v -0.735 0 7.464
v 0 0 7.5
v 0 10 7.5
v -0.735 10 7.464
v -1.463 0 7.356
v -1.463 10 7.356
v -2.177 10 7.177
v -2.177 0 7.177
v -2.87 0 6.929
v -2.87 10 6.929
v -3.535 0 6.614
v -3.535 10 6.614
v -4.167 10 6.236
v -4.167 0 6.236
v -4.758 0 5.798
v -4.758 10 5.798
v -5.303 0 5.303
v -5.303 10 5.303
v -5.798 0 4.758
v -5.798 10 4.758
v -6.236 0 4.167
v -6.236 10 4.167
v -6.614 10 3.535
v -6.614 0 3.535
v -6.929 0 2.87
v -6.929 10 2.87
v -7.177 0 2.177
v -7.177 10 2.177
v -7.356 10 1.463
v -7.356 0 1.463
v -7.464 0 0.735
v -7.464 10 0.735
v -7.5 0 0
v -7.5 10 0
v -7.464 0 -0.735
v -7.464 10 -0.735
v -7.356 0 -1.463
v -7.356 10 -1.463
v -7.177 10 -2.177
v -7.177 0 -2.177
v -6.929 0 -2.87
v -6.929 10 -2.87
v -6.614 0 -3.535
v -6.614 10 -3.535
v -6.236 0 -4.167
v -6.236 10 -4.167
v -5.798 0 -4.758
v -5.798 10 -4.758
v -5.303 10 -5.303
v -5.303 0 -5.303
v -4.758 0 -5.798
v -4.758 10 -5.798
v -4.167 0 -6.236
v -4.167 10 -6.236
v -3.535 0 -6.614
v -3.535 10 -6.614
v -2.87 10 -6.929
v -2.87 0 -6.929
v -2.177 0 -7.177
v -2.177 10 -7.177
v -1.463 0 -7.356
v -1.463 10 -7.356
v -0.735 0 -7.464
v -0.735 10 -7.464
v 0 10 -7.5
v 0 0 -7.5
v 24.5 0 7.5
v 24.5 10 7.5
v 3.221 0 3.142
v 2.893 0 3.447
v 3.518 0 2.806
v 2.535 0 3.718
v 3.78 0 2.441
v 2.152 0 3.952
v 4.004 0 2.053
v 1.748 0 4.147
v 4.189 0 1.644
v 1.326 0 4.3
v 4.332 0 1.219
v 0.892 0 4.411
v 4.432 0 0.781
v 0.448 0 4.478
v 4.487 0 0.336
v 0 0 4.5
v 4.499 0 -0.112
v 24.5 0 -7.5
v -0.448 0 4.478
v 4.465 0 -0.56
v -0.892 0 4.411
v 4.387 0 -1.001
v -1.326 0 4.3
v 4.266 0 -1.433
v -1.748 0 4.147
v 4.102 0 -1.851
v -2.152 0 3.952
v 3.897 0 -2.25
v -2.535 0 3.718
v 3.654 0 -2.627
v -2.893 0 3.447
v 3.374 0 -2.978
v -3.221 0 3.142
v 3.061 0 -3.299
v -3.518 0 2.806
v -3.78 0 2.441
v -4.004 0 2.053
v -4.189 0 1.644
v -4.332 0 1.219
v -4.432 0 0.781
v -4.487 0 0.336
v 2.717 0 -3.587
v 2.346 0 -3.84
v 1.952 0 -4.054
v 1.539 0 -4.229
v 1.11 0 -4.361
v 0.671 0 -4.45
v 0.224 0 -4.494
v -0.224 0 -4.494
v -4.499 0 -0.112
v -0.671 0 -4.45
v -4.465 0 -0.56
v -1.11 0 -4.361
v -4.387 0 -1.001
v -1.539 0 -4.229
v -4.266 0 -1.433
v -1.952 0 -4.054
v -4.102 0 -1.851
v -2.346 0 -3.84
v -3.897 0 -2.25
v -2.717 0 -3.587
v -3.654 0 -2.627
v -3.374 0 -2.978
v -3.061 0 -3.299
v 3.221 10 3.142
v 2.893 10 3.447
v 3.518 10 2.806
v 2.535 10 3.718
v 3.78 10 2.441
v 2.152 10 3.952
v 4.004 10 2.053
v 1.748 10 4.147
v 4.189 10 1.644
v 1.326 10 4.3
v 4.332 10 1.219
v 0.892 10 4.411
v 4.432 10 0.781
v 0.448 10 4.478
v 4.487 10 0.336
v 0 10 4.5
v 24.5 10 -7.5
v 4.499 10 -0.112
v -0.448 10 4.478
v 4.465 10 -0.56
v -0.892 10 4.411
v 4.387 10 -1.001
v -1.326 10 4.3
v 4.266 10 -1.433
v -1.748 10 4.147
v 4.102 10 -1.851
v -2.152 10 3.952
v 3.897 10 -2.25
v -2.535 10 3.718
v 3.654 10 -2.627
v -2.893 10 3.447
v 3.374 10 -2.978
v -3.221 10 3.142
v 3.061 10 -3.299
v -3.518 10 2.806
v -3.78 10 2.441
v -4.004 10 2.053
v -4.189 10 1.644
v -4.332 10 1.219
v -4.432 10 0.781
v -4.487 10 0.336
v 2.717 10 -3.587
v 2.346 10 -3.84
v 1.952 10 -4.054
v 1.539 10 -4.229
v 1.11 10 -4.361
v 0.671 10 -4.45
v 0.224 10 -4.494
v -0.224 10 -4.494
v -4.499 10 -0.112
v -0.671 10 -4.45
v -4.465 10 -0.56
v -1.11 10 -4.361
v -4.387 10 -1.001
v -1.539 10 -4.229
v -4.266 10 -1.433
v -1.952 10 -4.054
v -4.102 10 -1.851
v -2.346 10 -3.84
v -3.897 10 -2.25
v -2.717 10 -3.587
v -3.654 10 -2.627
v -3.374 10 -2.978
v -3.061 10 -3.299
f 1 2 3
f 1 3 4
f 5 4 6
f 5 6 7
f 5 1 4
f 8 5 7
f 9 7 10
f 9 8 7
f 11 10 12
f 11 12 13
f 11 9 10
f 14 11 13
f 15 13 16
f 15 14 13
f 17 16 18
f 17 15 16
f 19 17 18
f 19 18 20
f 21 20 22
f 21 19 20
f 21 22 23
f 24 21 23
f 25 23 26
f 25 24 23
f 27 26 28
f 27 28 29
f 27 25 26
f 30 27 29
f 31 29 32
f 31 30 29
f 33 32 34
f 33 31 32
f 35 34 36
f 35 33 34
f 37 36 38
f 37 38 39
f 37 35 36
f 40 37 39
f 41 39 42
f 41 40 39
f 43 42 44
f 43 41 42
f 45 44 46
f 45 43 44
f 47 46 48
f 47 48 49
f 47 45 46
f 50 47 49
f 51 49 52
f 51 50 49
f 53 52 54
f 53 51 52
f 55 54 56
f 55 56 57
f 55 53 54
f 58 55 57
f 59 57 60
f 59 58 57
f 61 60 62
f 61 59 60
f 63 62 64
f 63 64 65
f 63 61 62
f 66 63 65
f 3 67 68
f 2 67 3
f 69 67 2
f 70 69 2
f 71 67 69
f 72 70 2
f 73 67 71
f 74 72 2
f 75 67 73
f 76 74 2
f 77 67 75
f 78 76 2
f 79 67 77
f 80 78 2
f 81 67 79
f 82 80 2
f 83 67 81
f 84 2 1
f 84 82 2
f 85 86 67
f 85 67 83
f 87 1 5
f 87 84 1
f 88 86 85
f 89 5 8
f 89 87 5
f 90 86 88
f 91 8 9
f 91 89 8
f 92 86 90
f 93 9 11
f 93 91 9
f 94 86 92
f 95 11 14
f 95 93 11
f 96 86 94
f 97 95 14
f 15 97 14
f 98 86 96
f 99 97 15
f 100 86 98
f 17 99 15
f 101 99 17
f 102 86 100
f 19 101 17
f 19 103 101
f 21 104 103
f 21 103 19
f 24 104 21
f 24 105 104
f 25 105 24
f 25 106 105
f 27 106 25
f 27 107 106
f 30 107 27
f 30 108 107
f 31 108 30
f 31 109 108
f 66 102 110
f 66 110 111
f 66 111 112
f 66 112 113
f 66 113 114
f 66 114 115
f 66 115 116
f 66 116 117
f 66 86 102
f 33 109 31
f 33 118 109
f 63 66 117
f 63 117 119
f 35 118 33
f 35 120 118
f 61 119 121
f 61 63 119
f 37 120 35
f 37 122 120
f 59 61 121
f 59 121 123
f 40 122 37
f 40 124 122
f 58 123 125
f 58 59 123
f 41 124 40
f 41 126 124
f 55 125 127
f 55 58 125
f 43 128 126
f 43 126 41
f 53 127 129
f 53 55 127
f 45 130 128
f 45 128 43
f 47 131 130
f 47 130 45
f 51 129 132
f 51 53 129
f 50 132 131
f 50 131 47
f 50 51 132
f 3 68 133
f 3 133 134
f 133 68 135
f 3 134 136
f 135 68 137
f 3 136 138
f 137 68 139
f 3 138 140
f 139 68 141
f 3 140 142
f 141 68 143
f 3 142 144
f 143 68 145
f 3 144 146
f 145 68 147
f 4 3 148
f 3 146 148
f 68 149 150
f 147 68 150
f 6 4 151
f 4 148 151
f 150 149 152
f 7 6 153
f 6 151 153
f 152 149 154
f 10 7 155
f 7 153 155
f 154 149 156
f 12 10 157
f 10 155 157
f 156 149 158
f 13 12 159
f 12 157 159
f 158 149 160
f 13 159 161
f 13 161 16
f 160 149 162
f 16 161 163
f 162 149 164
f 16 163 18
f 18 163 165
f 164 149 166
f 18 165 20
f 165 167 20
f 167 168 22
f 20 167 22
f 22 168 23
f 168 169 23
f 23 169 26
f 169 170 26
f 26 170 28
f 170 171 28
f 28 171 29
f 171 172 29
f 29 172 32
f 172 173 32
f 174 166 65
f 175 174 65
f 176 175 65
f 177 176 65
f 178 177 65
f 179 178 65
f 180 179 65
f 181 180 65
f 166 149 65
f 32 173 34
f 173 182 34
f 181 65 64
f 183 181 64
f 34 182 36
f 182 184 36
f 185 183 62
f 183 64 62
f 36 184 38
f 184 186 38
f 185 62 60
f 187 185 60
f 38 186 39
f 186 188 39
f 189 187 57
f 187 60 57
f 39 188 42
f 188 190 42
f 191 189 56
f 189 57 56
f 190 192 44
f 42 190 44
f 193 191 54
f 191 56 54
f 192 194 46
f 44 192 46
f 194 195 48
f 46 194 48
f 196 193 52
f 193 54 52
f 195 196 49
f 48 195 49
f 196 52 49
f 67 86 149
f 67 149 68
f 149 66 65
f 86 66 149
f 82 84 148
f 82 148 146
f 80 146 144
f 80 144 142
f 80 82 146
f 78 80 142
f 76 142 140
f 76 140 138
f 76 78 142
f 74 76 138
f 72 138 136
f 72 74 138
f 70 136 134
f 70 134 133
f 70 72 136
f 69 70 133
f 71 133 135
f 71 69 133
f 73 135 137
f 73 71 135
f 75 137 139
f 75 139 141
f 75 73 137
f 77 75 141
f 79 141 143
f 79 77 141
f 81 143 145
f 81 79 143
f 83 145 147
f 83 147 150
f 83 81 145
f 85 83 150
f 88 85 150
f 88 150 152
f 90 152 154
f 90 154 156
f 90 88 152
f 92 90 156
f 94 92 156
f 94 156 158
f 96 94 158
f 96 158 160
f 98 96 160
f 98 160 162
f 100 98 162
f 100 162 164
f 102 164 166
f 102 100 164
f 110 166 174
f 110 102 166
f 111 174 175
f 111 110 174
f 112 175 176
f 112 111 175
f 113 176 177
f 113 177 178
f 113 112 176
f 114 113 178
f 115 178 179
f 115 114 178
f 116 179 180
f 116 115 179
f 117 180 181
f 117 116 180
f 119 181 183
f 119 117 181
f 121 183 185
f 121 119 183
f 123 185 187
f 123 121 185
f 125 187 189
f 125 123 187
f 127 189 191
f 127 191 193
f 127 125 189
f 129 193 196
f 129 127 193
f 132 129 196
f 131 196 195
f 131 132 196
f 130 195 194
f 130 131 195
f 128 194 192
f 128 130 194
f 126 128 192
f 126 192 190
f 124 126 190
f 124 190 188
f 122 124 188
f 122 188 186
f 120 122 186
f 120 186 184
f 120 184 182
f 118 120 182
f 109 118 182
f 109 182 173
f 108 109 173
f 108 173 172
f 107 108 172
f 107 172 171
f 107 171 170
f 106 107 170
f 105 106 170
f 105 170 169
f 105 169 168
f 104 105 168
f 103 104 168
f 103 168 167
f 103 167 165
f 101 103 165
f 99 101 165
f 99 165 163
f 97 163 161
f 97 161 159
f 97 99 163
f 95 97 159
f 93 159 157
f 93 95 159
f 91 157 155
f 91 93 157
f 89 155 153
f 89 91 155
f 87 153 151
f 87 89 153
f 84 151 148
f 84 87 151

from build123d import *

# Parameters (mm, degrees)
SKETCH_1_R      = 4.5
EXTRUDE_1_DEPTH = 10


with BuildPart() as part:
    # Эскиз1 → Бобышка-Вытянуть1 (new body)
    with BuildSketch(Plane(origin=(0, 0, 0), x_dir=(1, 0, 0), z_dir=(0, 1, 0))):
        with BuildLine():
            Line((24.5, -7.5), (0, -7.5))
            ThreePointArc((0, -7.5), (-7.5, 0), (0, 7.5))
            Line((0, 7.5), (24.5, 7.5))
            Line((24.5, 7.5), (24.5, -7.5))
        make_face()
        with Locations(Location((0, 0, 0), (0, 0, 270))):
            Circle(SKETCH_1_R, mode=Mode.SUBTRACT)
    extrude(amount=EXTRUDE_1_DEPTH)


solid = part.part
